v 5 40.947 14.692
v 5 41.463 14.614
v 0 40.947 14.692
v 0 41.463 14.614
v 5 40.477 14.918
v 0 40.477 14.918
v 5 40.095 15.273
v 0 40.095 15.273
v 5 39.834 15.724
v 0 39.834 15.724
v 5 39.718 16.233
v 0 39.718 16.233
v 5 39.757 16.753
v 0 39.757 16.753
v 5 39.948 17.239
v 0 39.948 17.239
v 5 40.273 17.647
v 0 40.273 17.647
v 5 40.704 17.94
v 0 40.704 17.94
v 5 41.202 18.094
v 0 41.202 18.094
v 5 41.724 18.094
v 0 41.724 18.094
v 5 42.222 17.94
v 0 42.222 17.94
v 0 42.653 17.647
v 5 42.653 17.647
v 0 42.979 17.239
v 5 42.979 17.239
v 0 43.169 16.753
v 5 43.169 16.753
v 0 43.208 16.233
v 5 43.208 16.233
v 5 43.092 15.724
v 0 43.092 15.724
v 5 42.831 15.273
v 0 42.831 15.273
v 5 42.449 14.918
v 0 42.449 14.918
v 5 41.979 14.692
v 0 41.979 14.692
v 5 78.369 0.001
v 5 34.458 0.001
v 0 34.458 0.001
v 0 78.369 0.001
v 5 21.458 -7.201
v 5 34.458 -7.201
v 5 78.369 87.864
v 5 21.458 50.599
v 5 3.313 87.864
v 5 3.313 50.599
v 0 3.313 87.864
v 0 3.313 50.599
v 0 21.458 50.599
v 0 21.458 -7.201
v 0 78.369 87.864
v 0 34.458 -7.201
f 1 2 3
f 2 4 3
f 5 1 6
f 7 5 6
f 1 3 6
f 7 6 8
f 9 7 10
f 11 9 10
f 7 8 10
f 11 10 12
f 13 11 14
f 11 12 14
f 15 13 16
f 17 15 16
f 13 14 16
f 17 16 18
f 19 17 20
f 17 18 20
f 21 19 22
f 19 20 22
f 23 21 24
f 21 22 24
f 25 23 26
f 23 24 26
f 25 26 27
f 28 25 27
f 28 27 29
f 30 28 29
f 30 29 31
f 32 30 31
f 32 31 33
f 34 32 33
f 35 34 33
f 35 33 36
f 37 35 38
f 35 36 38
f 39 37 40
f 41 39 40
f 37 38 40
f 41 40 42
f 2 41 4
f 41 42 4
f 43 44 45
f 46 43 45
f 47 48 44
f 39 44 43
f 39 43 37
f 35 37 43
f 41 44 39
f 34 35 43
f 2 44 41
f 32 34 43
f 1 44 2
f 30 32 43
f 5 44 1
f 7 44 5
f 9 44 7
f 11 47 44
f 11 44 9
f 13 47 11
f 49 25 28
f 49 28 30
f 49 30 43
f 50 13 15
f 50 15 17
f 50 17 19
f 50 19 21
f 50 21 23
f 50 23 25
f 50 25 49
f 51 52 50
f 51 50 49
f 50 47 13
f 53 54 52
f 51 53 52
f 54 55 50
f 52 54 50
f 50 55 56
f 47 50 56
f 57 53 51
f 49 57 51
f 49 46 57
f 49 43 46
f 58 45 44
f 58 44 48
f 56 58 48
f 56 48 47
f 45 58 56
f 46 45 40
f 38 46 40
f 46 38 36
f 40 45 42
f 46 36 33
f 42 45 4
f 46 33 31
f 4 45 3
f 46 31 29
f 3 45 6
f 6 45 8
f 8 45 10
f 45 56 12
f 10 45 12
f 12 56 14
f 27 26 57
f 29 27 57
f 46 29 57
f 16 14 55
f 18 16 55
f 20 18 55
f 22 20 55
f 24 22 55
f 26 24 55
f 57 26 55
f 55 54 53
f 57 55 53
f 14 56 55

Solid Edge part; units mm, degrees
sketch "Sketch1" plane through (0, 0, 0) normal (1, 0, 0) x (0, 1, 0)
  line L0 (21.4576, 50.5988) -> (21.4576, -7.2012)
  line L1 (34.4576, -7.2012) -> (21.4576, -7.2012)
  line L2 (34.4576, 50.5988) -> (34.4576, -7.2012)
  line L3 (34.4576, 50.5988) -> (21.4576, 50.5988)
extrude "Protrusion1" add sketch "Sketch1" along normal blind 5
sketch "Sketch2" plane through (2.5, 26.4576, 50.5988) normal (0, 0, 1) x (0, 1, 0)
  line L0 (-5, -2.5) -> (5, -2.5)
  line L1 (5, -2.5) -> (5, 2.5)
  line L2 (5, 2.5) -> (-5, 2.5)
  line L3 (-48.6449, 2.5) -> (-5, 2.5)
  line L4 (-48.6449, -2.5) -> (-48.6449, 2.5)
  line L5 (-5, -2.5) -> (-48.6449, -2.5)
extrude "ExtrudedProtrusion_2" add sketch "Sketch2" along normal blind 37.265
sketch "Sketch3" plane through (2.5, 31.4576, 40.3313) normal (0, 1, 0) x (0, 0, -1)
  line L0 (40.3303, 2.5) -> (-47.5325, 2.5)
  line L1 (-47.5325, -2.5) -> (-47.5325, 2.5)
  line L2 (40.3303, -2.5) -> (-47.5325, -2.5)
  line L3 (40.3303, -2.5) -> (40.3303, 2.5)
extrude "ExtrudedProtrusion_3" add sketch "Sketch3" along normal blind 46.9115
sketch "Sketch4" plane through (2.5, 28.0909, 87.8638) normal (0, 0, 1) x (0, 1, 0)
  line L0 (-24.7782, 2.5) -> (-24.7782, -2.5)
  line L1 (-24.7782, -2.5) -> (-51.7696, -2.5)
  line L2 (-51.7696, -2.5) -> (-51.7696, 2.5)
  line L3 (-51.7696, 2.5) -> (-24.7782, 2.5)
extrude "ExtrudedCutout_2" cut sketch "Sketch4" against normal blind 243.9976
sketch "Sketch5" plane through (0, 40.8409, 40.3313) normal (-1, 0, 0) x (0, 0, -1)
  circle A0 centre (23.9675, -0.6222) radius 1.75
  dimension "D1" = 4.9
  dimension "D2" = 3.5
  dimension "D3" = 0.25
extrude "ExtrudedCutout_3" cut sketch "Sketch5" against normal blind 61.0187
